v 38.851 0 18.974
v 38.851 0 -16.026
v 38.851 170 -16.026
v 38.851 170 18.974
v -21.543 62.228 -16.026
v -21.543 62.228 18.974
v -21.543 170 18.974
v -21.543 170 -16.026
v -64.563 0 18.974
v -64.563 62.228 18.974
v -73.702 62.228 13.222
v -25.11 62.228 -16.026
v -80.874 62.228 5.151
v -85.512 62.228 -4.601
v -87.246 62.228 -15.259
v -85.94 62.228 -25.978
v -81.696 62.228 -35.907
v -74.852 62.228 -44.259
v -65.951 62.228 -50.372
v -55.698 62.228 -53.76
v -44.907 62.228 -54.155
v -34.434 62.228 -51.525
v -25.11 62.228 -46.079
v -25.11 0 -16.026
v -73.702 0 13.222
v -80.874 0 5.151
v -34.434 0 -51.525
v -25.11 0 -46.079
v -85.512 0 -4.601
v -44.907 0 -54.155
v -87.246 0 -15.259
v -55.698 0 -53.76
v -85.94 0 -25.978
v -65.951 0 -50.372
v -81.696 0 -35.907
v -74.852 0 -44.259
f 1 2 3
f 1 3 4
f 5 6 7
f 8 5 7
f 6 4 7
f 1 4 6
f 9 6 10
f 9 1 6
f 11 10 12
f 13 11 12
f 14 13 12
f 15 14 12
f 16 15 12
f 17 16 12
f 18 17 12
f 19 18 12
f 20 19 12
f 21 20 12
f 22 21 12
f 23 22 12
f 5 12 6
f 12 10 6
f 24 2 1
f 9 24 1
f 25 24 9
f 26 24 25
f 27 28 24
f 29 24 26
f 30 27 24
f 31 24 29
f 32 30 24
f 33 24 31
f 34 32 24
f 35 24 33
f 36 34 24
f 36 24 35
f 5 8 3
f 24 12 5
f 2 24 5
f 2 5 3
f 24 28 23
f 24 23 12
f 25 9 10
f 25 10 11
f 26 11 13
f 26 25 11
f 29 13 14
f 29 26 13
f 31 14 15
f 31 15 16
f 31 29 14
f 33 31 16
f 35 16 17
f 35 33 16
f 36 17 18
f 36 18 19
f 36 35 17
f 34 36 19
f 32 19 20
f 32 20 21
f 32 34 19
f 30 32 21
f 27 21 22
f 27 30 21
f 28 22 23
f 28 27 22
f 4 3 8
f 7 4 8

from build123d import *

# Parameters (mm, degrees)
EXTRUDE_1_DEPTH     = 170
SKETCH_3_W          = 66.248134628
SKETCH_3_H          = 139.711623237
CUT_EXTRUDE_1_DEPTH = 170


with BuildPart() as part:
    # 草图1 → 凸台-拉伸1 (new body)
    with BuildSketch(Plane(origin=(0, 0, 0), x_dir=(1, 0, 0), z_dir=(0, 1, 0))):
        with BuildLine():
            Line((-25.11018553, 16.026132479), (38.850953275, 16.026132479))
            Line((38.850953275, 16.026132479), (38.850953275, -18.973867521))
            Line((38.850953275, -18.973867521), (-64.562961279, -18.973867521))
            ThreePointArc((-64.562961279, -18.973867521), (-81.696259365, 35.906986737), (-25.11018553, 46.079219305))
            Line((-25.11018553, 46.079219305), (-25.11018553, 16.026132479))
        make_face()
    extrude(amount=EXTRUDE_1_DEPTH)

    # 草图3 → 切除-拉伸1 (cut)
    with BuildSketch(Plane.XY.offset(18.973867521)):
        with Locations((-54.667445772, 132.083845768)):
            Rectangle(SKETCH_3_W, SKETCH_3_H)
    extrude(amount=-CUT_EXTRUDE_1_DEPTH, mode=Mode.SUBTRACT)


solid = part.part
